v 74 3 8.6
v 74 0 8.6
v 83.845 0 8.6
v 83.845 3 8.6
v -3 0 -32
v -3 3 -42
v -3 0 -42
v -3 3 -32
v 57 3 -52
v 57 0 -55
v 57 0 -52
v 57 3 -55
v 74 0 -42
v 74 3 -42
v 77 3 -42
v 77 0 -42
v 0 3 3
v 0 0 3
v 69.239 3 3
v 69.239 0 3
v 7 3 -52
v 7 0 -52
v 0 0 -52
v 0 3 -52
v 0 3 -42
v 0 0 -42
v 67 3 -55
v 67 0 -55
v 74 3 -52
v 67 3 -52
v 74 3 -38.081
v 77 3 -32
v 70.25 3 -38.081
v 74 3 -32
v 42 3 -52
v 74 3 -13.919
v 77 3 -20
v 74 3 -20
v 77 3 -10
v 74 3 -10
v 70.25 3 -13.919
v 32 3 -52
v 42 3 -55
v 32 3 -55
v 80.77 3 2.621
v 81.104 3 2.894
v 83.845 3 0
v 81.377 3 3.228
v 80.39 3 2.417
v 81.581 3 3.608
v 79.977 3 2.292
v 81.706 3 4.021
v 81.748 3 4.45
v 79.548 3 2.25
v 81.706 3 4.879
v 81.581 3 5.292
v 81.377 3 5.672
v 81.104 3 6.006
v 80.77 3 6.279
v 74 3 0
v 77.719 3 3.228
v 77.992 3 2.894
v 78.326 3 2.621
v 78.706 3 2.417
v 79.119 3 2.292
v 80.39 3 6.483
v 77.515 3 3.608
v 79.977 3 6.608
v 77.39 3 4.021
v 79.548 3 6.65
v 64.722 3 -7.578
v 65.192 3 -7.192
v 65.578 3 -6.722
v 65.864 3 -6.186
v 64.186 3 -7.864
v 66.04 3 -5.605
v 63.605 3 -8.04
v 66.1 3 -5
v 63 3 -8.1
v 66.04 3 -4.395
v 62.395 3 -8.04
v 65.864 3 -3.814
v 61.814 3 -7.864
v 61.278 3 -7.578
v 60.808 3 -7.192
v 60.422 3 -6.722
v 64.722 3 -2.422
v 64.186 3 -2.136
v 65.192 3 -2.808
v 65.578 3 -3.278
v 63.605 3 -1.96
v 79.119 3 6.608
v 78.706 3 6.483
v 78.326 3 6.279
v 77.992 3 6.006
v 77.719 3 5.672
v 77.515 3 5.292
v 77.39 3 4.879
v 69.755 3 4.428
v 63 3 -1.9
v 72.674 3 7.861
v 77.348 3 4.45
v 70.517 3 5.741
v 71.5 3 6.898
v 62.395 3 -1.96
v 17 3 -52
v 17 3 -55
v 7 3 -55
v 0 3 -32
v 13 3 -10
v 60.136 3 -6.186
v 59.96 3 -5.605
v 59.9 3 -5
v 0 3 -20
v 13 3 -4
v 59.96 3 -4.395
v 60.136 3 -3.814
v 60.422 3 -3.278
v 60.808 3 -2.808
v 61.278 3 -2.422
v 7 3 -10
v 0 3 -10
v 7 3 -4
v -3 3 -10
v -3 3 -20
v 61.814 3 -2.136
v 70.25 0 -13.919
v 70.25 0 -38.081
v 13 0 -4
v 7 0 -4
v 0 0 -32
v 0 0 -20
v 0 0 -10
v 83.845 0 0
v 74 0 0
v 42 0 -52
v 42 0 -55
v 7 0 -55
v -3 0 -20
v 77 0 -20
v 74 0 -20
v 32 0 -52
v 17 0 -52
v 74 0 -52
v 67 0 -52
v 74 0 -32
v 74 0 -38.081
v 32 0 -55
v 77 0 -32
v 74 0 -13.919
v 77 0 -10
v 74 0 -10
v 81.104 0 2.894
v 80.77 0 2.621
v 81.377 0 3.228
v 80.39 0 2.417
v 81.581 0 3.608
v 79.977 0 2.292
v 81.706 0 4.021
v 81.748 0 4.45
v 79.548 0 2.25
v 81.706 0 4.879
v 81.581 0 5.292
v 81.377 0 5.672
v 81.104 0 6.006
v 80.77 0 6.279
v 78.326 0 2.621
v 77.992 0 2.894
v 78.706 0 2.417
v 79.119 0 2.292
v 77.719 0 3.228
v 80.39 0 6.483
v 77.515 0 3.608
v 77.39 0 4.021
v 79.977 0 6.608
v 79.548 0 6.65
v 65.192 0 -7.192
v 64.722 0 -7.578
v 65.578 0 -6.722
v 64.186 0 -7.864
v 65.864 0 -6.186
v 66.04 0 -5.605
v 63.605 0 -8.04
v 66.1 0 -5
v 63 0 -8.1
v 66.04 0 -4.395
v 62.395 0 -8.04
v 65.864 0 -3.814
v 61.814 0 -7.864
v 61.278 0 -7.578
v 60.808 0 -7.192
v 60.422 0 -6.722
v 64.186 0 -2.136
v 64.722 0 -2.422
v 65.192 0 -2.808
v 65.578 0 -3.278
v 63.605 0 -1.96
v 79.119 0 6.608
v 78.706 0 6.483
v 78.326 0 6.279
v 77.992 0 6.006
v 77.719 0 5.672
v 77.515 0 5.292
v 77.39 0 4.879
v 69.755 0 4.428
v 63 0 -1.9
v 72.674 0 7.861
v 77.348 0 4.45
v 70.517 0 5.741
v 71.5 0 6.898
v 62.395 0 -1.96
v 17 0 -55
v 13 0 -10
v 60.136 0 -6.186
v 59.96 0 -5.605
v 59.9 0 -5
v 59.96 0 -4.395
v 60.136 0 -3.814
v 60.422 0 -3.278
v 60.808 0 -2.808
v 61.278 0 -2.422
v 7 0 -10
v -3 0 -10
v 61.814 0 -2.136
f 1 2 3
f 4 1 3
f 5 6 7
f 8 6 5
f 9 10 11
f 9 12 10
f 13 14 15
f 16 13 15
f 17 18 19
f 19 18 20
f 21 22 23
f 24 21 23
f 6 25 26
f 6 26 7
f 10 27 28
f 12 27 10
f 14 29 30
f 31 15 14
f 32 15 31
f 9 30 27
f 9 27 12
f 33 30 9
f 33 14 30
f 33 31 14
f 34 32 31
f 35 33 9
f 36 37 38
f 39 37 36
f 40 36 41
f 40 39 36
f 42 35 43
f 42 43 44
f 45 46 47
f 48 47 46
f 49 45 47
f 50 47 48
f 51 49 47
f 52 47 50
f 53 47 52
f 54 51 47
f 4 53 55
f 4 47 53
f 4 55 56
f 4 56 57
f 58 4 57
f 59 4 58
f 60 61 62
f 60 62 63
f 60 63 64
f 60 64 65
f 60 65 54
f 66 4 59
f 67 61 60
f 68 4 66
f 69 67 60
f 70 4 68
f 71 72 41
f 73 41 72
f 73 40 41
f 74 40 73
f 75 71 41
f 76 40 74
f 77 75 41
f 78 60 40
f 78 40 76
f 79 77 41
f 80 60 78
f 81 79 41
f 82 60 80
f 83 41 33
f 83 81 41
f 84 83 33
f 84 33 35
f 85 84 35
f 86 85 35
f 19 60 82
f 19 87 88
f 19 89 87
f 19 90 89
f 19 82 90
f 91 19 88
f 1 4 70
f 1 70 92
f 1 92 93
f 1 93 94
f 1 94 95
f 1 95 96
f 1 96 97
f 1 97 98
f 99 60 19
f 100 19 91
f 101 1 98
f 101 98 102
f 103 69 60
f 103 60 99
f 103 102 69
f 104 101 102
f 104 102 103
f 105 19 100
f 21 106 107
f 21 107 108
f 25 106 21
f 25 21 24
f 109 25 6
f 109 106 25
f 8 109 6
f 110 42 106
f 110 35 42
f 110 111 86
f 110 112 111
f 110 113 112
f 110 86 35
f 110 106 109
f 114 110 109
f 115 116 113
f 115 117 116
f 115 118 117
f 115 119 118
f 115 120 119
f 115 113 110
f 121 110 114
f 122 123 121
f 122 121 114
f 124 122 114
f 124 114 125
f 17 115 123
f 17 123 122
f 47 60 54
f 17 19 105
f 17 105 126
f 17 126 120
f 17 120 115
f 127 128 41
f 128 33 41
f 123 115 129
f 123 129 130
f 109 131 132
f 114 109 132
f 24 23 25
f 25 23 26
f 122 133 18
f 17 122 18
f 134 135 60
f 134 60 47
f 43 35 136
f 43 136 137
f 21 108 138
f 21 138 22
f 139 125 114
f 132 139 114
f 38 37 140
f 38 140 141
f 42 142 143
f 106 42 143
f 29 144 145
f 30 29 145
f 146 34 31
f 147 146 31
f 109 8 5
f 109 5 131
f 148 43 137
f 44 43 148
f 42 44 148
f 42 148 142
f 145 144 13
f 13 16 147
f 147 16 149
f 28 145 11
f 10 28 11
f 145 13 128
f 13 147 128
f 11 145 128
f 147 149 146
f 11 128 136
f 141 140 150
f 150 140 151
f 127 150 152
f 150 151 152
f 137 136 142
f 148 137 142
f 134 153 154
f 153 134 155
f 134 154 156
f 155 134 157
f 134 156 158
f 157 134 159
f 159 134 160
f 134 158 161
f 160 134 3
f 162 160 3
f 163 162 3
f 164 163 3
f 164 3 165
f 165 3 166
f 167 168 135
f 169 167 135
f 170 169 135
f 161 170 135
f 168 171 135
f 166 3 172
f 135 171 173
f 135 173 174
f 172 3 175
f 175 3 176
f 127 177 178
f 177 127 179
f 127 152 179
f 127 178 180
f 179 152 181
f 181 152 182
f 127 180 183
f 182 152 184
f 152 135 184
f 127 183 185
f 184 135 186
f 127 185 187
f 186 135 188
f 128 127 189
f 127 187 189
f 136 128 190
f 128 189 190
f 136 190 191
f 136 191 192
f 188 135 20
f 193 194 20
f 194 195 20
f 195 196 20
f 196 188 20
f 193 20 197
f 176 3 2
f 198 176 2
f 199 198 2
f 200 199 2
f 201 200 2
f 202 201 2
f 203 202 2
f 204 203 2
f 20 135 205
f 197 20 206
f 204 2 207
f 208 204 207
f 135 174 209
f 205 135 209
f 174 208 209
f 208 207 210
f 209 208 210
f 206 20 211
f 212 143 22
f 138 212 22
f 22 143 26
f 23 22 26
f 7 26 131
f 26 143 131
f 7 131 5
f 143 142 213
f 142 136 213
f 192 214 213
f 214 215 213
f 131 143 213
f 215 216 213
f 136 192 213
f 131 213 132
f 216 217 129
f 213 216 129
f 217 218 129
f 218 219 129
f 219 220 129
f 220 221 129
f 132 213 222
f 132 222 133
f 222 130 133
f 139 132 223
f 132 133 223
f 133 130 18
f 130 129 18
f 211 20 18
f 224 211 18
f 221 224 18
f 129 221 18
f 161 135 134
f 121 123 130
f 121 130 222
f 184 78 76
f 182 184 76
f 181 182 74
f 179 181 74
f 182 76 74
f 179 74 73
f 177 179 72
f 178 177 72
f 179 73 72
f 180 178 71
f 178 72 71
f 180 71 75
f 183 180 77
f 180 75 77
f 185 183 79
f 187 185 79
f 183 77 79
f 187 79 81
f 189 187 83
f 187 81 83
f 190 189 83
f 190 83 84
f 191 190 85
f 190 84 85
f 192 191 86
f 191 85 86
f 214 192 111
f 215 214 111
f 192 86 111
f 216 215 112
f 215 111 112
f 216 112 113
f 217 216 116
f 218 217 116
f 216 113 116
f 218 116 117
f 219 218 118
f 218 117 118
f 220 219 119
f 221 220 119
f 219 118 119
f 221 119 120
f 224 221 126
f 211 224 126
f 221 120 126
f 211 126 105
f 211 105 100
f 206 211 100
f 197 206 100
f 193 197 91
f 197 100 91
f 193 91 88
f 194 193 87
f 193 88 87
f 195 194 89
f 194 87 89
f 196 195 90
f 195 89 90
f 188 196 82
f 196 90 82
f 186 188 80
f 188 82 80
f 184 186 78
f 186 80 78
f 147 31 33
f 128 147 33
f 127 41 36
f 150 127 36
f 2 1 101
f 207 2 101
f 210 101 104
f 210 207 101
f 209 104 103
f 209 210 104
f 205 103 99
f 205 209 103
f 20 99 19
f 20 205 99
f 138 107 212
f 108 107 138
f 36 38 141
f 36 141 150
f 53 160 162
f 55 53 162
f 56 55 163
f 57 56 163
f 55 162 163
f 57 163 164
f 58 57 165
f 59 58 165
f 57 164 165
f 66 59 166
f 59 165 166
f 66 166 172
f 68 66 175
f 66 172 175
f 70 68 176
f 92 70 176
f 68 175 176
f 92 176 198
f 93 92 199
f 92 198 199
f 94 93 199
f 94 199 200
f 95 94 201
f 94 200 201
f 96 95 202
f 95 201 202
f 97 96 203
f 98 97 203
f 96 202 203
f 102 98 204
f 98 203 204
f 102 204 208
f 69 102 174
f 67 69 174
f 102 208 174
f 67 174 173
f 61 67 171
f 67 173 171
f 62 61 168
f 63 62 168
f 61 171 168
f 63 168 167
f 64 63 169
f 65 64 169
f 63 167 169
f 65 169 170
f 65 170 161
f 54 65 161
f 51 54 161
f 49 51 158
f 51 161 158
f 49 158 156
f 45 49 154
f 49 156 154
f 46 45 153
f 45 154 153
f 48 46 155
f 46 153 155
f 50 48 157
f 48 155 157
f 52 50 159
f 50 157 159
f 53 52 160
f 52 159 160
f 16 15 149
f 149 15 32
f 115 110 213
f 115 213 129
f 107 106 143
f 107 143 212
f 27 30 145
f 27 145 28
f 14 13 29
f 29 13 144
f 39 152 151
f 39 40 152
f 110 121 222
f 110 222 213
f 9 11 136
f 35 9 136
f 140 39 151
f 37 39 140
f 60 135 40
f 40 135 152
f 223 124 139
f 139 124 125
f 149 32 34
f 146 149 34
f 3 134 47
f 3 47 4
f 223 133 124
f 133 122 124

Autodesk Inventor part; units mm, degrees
ref_plane "YZ Plane" through (0, 0, 0) normal (1, 0, 0) x (0, 1, 0)
ref_plane "XZ Plane" through (0, 0, 0) normal (0, 1, 0) x (-1, 0, 0)
ref_plane "XY Plane" through (0, 0, 0) normal (0, 0, 1) x (1, 0, 0)
sketch "Esboço1" plane through (0, 0, 0) normal (0, 1, 0) x (-1, 0, 0)
  line L0 (0, 0) -> (-74, 0)
  line L1 (-74, 0) -> (-74, -52)
  line L2 (-74, -52) -> (0, -52)
  line L3 (0, -52) -> (0, 0)
  line L4 (-6.0465, -39.0348) -> (-22.7965, -39.0348)
  line L5 (-22.7965, -39.0348) -> (-22.7965, -36.6698)
  line L6 (-22.7965, -36.6698) -> (-6.0465, -36.6698)
  line L7 (-6.0465, -36.6698) -> (-6.0465, -39.0348)
  dimension "d0" = 74
  dimension "d1" = 52
  dimension "d22" = 16.75
  dimension "d23" = 2.365
extrude "Extrusão1" add sketch "Esboço1" along normal blind 3 contours L3 L2 L1 L0 | L4 L5 L6 L7
sketch "Esboço2" plane through (0, 3, 0) normal (0, 1, 0) x (1, 0, 0)
  line L0 (0, 52) -> (0, 0) projected
  line L1 (74, 52) -> (0, 52) projected
  line L2 (7, 52) -> (17, 52)
  line L3 (17, 52) -> (17, 55)
  line L4 (17, 55) -> (7, 55)
  line L5 (7, 55) -> (7, 52)
  line L6 (32, 52) -> (42, 52)
  line L7 (42, 52) -> (42, 55)
  line L8 (42, 55) -> (32, 55)
  line L9 (32, 55) -> (32, 52)
  line L10 (57, 52) -> (67, 52)
  line L11 (67, 52) -> (67, 55)
  line L12 (67, 55) -> (57, 55)
  line L13 (57, 55) -> (57, 52)
  line L14 (74, 0) -> (74, 52) projected
  point P0 (17, 52)
  point P1 (67, 52)
  point P2 (42, 52)
  point P3 (7, 53.5)
  point P4 (67, 53.5)
  point P5 (57, 53.5)
  point P6 (42, 53.5)
  point P7 (17, 53.5)
  point P8 (32, 53.5)
  point P9 (0, 26)
  dimension "d13" = 3
  dimension "d38" = 7
  dimension "d39" = 7
  dimension "d40" = 15
  dimension "d42" = 10
  dimension "d44" = 10
  dimension "d45" = 10
extrude "Extrusão2" add sketch "Esboço2" against normal blind 3
sketch "Esboço5" plane through (0, 3, 0) normal (0, 1, 0) x (1, 0, 0)
  circle A0 centre (63, 5) radius 3.1
  line L0 (0, 52) -> (0, 0) projected
  line L1 (7, 52) -> (0, 52) projected
  line L2 (74, 0) -> (74, 52) projected
  line L3 (0, 0) -> (74, 0) projected
  point P0 (3.5, 52)
  dimension "d46" = 6.2
  dimension "d113" = 11
  dimension "d114" = 52
  dimension "d116" = 5
extrude "Extrusão4" cut sketch "Esboço5" against normal blind 10
sketch "Esboço6" plane through (0, 3, 0) normal (0, 1, 0) x (1, 0, 0)
  line L0 (70.25, 13.9187) -> (74, 13.9188)
  line L1 (74, 13.9188) -> (74, 38.0813)
  line L2 (74, 38.0813) -> (70.25, 38.0813)
  line L3 (70.25, 38.0813) -> (70.25, 13.9187)
  line L4 (74, 0) -> (74, 52) projected
  line L5 (74, 52) -> (67, 52) projected
  line L6 (0, 0) -> (74, 0) projected
  point P0 (72.125, 38.0813)
  dimension "d49" = 3.75
  dimension "d50" = 24.1625
  dimension "d51" = 0
  dimension "d55" = 13.9187
  dimension "d100" = 13.9187
extrude "Extrusão5" cut sketch "Esboço6" against normal blind 10
sketch "Esboço7" plane through (0, 3, 0) normal (0, 1, 0) x (1, 0, 0)
  line L0 (0, 10) -> (-3, 10)
  line L1 (-3, 10) -> (-3, 20)
  line L2 (-3, 20) -> (0, 20)
  line L3 (0, 20) -> (0, 10)
  line L4 (0, 42) -> (-3, 42)
  line L5 (-3, 42) -> (-3, 32)
  line L6 (-3, 32) -> (0, 32)
  line L7 (0, 32) -> (0, 42)
  line L8 (7, 52) -> (0, 52) projected
  line L9 (0, 0) -> (74, 0) projected
  line L10 (74, 10) -> (77, 10)
  line L11 (77, 10) -> (77, 20)
  line L12 (77, 20) -> (74, 20)
  line L13 (74, 20) -> (74, 10)
  line L14 (74, 52) -> (67, 52) projected
  line L15 (74, 38.0813) -> (74, 52) projected
  line L16 (74, 42) -> (77, 42)
  line L17 (77, 42) -> (77, 32)
  line L18 (77, 32) -> (74, 32)
  line L19 (74, 32) -> (74, 42)
  line L20 (0, 0) -> (74, 0) projected
  point P0 (-1.5, 42)
  point P1 (7, 0)
  point P2 (-1.5, 10)
  point P3 (75.5, 42)
  point P4 (67, 0)
  point P5 (37, 0)
  point P6 (75.5, 10)
  dimension "d66" = 3
  dimension "d67" = 10
  dimension "d68" = 3
  dimension "d69" = 10
  dimension "d70" = 10
  dimension "d71" = 10
  dimension "d74" = 3
  dimension "d76" = 3
  dimension "d77" = 10
  dimension "d78" = 10
  dimension "d81" = 10
extrude "Extrusão6" add sketch "Esboço7" against normal blind 3
sketch "Esboço8" plane through (0, 0, 0) normal (0, -1, 0) x (1, 0, 0)
  line L0 (0, 0) -> (74, 0) projected
  line L1 (69, 0) -> (83.8454, 0)
  line L2 (83.8454, 0) -> (83.8454, 8.6)
  line L3 (74, 0) -> (74, -10) projected
  circle A0 centre (79.548, 4.45) radius 2.2
  line L4 (74, 0) -> (74, 8.6)
  arc A1 (74, 8.6) -> (69, 0) centre (77.4588, 0.8356) ccw
  line L5 (74, 8.6) -> (83.8454, 8.6)
  point P0 (83.8454, 4.3)
  point P1 (74, 4.3)
  dimension "d84" = 8.6
  dimension "d86" = 4.4
  dimension "d94" = 8.5
  dimension "d99" = 5
  dimension "d101" = 4.15
  dimension "d104" = 5.55
  dimension "d106" = 4.3
extrude "Extrusão7" add sketch "Esboço8" against normal blind 3
sketch "Esboço10" plane through (0, 0, 0) normal (0, -1, 0) x (1, 0, 0)
  line L0 (83.8454, 0) -> (74, 0) projected
  line L1 (74, 0) -> (0, 0)
  line L2 (0, 0) -> (0, 3)
  line L3 (0, 3) -> (74, 3)
  line L4 (74, 3) -> (74, 0)
  dimension "d95" = 3
extrude "Extrusão9" add sketch "Esboço10" against normal blind 3
sketch "Esboço11" plane through (0, 3, 0) normal (0, 1, 0) x (1, 0, 0)
  line L0 (13, 4) -> (7, 4)
  line L1 (7, 4) -> (7, 10)
  line L2 (7, 10) -> (13, 10)
  line L3 (13, 10) -> (13, 4)
  line L4 (0, 10) -> (0, -3) projected
  line L5 (0, -3) -> (69.239, -3) projected
  line L6 (-3, 10) -> (0, 10) projected
  point P0 (0, 0)
  dimension "d107" = 6
  dimension "d108" = 6
  dimension "d109" = 7
  dimension "d115" = 0
extrude "Extrusão10" cut sketch "Esboço11" against normal blind 10
equation "\"d40\" = d12"
equation "\"d12\" = 15"
properties part number "Parede_lateral_2"
